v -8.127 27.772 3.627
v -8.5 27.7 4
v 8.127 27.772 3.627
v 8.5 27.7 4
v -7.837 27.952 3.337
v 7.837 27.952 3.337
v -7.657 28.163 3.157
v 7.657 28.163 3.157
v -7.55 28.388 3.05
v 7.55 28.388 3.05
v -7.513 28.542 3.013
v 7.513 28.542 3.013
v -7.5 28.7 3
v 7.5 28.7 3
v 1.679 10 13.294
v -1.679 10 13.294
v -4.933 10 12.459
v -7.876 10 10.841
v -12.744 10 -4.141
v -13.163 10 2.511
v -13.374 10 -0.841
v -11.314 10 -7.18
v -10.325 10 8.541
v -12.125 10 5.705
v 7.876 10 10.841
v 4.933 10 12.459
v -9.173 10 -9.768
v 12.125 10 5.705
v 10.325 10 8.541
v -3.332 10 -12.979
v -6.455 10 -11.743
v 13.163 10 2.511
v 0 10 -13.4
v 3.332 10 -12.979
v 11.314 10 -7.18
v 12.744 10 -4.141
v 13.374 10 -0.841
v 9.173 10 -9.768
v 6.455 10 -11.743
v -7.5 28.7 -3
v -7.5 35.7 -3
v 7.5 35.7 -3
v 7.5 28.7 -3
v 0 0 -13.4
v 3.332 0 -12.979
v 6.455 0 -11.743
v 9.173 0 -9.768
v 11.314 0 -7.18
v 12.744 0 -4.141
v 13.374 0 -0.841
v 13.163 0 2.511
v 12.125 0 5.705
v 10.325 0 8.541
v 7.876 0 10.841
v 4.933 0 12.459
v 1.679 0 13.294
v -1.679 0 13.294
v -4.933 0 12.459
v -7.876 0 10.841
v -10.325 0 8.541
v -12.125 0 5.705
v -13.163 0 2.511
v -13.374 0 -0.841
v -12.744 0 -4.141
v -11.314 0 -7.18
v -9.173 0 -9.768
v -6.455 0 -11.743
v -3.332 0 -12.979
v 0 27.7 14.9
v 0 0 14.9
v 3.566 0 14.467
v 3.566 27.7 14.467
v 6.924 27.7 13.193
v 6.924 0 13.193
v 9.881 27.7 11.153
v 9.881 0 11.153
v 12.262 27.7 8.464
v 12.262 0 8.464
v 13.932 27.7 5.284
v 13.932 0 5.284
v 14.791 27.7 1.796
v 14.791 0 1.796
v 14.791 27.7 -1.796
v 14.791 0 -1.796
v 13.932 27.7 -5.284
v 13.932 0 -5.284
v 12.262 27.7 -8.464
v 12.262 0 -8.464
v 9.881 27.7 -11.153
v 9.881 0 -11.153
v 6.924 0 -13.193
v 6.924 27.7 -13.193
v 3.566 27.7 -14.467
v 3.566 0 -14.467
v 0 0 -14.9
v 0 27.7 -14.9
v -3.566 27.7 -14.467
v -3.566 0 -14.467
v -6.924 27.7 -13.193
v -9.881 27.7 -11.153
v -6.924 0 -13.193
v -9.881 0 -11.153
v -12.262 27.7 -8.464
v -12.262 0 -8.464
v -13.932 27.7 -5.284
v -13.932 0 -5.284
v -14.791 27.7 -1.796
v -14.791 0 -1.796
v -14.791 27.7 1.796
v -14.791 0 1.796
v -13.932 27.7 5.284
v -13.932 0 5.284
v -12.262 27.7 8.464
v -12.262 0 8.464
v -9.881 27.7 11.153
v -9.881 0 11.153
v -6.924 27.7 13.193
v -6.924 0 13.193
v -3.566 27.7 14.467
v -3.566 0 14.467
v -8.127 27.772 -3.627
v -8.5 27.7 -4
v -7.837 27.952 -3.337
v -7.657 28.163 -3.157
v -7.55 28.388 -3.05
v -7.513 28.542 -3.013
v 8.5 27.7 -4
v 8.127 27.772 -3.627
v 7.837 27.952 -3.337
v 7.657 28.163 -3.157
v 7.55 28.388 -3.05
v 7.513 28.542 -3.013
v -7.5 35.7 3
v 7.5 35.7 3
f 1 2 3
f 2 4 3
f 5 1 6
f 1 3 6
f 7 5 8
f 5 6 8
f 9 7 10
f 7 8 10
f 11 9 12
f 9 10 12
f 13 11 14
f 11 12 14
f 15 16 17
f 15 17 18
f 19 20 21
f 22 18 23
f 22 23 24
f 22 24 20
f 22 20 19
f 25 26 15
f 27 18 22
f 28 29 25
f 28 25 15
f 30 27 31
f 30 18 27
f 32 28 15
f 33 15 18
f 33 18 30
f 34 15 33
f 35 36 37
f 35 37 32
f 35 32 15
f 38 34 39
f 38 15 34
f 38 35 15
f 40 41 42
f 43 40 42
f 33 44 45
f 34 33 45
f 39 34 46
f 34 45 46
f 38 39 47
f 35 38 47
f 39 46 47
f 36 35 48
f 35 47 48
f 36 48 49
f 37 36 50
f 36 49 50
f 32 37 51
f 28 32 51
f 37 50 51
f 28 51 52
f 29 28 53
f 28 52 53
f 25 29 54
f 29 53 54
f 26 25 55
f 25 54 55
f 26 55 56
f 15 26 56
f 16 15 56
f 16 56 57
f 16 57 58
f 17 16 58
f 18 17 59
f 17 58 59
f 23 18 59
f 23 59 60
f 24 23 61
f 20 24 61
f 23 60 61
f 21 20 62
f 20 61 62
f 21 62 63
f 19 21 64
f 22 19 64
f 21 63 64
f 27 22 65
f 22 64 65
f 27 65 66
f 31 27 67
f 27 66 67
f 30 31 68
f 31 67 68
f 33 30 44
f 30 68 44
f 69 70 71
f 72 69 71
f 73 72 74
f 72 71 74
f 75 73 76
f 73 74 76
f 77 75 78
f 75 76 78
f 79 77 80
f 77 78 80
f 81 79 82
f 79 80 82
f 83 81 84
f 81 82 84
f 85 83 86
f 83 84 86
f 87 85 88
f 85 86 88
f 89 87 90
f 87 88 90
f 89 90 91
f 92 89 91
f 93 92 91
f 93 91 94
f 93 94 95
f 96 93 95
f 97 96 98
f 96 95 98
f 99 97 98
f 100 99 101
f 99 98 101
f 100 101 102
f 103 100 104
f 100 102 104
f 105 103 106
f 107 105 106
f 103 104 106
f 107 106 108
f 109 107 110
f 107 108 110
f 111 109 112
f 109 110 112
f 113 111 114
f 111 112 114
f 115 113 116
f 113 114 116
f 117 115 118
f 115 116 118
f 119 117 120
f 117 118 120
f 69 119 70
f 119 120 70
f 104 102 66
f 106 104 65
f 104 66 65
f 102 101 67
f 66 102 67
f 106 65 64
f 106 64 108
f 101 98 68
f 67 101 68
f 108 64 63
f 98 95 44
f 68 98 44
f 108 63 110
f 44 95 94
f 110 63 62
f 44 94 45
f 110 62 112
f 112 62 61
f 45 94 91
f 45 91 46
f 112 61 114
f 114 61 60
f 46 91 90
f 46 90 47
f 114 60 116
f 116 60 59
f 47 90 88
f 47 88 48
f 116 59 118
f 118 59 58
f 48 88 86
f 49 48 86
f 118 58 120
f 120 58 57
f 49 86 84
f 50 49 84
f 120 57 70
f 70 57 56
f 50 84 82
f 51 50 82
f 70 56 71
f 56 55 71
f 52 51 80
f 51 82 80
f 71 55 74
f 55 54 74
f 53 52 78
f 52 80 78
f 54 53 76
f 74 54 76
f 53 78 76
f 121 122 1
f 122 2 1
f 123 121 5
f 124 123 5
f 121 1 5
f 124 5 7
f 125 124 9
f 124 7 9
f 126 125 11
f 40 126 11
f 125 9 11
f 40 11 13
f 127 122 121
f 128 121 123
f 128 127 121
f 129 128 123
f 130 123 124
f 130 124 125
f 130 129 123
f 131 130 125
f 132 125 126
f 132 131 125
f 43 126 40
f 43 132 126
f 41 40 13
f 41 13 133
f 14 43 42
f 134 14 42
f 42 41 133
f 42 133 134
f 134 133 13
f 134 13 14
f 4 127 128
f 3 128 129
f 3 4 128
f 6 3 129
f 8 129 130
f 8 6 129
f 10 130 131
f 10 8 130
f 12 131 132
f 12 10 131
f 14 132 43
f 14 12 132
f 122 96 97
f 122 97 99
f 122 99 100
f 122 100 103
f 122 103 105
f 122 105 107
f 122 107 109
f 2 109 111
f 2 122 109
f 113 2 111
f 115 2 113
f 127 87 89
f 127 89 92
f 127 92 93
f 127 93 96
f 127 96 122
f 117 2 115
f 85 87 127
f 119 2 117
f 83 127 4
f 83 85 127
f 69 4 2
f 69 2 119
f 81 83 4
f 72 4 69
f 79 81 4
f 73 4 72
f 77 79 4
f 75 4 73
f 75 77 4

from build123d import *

# Parameters (mm, degrees)
SKETCH1_R                = 14.9
BOSS_EXTRUDE1_DEPTH      = 27.7
SKETCH2_R                = 13.4
CUT_EXTRUDE1_DEPTH       = 10
BOSS_EXTRUDE2_DEPTH      = 3
BOSS_EXTRUDE2_DEPTH_BACK = 3
SKETCH3_W                = 15
SKETCH3_H                = 8
FILLET1_R                = 1


with BuildPart() as part:
    # Sketch1 → Boss-Extrude1 (new body)
    with BuildSketch(Plane(origin=(0, 0, 0), x_dir=(1, 0, 0), z_dir=(0, 1, 0))):
        Circle(SKETCH1_R)
    extrude(amount=BOSS_EXTRUDE1_DEPTH)

    # Sketch2 → Cut-Extrude1 (cut)
    with BuildSketch(Plane.XZ):
        Circle(SKETCH2_R)
    extrude(amount=-CUT_EXTRUDE1_DEPTH, mode=Mode.SUBTRACT)

    # Sketch3 → Boss-Extrude2 (add, two sides: drawn at the far end of the back side and taken through both)
    with BuildSketch(Plane.XY.offset(-BOSS_EXTRUDE2_DEPTH_BACK)):
        with Locations((0, 31.7)):
            Rectangle(SKETCH3_W, SKETCH3_H)
    extrude(amount=BOSS_EXTRUDE2_DEPTH + BOSS_EXTRUDE2_DEPTH_BACK)

    # Fillet1
    fillet1_edges = [part.edges().sort_by_distance(p)[0] for p in [
        (7.5, 27.7, 0),
        (0, 27.7, -3),
        (-7.5, 27.7, 0),
        (0, 27.7, 3),
    ]]
    fillet(fillet1_edges, radius=FILLET1_R)


solid = part.part
